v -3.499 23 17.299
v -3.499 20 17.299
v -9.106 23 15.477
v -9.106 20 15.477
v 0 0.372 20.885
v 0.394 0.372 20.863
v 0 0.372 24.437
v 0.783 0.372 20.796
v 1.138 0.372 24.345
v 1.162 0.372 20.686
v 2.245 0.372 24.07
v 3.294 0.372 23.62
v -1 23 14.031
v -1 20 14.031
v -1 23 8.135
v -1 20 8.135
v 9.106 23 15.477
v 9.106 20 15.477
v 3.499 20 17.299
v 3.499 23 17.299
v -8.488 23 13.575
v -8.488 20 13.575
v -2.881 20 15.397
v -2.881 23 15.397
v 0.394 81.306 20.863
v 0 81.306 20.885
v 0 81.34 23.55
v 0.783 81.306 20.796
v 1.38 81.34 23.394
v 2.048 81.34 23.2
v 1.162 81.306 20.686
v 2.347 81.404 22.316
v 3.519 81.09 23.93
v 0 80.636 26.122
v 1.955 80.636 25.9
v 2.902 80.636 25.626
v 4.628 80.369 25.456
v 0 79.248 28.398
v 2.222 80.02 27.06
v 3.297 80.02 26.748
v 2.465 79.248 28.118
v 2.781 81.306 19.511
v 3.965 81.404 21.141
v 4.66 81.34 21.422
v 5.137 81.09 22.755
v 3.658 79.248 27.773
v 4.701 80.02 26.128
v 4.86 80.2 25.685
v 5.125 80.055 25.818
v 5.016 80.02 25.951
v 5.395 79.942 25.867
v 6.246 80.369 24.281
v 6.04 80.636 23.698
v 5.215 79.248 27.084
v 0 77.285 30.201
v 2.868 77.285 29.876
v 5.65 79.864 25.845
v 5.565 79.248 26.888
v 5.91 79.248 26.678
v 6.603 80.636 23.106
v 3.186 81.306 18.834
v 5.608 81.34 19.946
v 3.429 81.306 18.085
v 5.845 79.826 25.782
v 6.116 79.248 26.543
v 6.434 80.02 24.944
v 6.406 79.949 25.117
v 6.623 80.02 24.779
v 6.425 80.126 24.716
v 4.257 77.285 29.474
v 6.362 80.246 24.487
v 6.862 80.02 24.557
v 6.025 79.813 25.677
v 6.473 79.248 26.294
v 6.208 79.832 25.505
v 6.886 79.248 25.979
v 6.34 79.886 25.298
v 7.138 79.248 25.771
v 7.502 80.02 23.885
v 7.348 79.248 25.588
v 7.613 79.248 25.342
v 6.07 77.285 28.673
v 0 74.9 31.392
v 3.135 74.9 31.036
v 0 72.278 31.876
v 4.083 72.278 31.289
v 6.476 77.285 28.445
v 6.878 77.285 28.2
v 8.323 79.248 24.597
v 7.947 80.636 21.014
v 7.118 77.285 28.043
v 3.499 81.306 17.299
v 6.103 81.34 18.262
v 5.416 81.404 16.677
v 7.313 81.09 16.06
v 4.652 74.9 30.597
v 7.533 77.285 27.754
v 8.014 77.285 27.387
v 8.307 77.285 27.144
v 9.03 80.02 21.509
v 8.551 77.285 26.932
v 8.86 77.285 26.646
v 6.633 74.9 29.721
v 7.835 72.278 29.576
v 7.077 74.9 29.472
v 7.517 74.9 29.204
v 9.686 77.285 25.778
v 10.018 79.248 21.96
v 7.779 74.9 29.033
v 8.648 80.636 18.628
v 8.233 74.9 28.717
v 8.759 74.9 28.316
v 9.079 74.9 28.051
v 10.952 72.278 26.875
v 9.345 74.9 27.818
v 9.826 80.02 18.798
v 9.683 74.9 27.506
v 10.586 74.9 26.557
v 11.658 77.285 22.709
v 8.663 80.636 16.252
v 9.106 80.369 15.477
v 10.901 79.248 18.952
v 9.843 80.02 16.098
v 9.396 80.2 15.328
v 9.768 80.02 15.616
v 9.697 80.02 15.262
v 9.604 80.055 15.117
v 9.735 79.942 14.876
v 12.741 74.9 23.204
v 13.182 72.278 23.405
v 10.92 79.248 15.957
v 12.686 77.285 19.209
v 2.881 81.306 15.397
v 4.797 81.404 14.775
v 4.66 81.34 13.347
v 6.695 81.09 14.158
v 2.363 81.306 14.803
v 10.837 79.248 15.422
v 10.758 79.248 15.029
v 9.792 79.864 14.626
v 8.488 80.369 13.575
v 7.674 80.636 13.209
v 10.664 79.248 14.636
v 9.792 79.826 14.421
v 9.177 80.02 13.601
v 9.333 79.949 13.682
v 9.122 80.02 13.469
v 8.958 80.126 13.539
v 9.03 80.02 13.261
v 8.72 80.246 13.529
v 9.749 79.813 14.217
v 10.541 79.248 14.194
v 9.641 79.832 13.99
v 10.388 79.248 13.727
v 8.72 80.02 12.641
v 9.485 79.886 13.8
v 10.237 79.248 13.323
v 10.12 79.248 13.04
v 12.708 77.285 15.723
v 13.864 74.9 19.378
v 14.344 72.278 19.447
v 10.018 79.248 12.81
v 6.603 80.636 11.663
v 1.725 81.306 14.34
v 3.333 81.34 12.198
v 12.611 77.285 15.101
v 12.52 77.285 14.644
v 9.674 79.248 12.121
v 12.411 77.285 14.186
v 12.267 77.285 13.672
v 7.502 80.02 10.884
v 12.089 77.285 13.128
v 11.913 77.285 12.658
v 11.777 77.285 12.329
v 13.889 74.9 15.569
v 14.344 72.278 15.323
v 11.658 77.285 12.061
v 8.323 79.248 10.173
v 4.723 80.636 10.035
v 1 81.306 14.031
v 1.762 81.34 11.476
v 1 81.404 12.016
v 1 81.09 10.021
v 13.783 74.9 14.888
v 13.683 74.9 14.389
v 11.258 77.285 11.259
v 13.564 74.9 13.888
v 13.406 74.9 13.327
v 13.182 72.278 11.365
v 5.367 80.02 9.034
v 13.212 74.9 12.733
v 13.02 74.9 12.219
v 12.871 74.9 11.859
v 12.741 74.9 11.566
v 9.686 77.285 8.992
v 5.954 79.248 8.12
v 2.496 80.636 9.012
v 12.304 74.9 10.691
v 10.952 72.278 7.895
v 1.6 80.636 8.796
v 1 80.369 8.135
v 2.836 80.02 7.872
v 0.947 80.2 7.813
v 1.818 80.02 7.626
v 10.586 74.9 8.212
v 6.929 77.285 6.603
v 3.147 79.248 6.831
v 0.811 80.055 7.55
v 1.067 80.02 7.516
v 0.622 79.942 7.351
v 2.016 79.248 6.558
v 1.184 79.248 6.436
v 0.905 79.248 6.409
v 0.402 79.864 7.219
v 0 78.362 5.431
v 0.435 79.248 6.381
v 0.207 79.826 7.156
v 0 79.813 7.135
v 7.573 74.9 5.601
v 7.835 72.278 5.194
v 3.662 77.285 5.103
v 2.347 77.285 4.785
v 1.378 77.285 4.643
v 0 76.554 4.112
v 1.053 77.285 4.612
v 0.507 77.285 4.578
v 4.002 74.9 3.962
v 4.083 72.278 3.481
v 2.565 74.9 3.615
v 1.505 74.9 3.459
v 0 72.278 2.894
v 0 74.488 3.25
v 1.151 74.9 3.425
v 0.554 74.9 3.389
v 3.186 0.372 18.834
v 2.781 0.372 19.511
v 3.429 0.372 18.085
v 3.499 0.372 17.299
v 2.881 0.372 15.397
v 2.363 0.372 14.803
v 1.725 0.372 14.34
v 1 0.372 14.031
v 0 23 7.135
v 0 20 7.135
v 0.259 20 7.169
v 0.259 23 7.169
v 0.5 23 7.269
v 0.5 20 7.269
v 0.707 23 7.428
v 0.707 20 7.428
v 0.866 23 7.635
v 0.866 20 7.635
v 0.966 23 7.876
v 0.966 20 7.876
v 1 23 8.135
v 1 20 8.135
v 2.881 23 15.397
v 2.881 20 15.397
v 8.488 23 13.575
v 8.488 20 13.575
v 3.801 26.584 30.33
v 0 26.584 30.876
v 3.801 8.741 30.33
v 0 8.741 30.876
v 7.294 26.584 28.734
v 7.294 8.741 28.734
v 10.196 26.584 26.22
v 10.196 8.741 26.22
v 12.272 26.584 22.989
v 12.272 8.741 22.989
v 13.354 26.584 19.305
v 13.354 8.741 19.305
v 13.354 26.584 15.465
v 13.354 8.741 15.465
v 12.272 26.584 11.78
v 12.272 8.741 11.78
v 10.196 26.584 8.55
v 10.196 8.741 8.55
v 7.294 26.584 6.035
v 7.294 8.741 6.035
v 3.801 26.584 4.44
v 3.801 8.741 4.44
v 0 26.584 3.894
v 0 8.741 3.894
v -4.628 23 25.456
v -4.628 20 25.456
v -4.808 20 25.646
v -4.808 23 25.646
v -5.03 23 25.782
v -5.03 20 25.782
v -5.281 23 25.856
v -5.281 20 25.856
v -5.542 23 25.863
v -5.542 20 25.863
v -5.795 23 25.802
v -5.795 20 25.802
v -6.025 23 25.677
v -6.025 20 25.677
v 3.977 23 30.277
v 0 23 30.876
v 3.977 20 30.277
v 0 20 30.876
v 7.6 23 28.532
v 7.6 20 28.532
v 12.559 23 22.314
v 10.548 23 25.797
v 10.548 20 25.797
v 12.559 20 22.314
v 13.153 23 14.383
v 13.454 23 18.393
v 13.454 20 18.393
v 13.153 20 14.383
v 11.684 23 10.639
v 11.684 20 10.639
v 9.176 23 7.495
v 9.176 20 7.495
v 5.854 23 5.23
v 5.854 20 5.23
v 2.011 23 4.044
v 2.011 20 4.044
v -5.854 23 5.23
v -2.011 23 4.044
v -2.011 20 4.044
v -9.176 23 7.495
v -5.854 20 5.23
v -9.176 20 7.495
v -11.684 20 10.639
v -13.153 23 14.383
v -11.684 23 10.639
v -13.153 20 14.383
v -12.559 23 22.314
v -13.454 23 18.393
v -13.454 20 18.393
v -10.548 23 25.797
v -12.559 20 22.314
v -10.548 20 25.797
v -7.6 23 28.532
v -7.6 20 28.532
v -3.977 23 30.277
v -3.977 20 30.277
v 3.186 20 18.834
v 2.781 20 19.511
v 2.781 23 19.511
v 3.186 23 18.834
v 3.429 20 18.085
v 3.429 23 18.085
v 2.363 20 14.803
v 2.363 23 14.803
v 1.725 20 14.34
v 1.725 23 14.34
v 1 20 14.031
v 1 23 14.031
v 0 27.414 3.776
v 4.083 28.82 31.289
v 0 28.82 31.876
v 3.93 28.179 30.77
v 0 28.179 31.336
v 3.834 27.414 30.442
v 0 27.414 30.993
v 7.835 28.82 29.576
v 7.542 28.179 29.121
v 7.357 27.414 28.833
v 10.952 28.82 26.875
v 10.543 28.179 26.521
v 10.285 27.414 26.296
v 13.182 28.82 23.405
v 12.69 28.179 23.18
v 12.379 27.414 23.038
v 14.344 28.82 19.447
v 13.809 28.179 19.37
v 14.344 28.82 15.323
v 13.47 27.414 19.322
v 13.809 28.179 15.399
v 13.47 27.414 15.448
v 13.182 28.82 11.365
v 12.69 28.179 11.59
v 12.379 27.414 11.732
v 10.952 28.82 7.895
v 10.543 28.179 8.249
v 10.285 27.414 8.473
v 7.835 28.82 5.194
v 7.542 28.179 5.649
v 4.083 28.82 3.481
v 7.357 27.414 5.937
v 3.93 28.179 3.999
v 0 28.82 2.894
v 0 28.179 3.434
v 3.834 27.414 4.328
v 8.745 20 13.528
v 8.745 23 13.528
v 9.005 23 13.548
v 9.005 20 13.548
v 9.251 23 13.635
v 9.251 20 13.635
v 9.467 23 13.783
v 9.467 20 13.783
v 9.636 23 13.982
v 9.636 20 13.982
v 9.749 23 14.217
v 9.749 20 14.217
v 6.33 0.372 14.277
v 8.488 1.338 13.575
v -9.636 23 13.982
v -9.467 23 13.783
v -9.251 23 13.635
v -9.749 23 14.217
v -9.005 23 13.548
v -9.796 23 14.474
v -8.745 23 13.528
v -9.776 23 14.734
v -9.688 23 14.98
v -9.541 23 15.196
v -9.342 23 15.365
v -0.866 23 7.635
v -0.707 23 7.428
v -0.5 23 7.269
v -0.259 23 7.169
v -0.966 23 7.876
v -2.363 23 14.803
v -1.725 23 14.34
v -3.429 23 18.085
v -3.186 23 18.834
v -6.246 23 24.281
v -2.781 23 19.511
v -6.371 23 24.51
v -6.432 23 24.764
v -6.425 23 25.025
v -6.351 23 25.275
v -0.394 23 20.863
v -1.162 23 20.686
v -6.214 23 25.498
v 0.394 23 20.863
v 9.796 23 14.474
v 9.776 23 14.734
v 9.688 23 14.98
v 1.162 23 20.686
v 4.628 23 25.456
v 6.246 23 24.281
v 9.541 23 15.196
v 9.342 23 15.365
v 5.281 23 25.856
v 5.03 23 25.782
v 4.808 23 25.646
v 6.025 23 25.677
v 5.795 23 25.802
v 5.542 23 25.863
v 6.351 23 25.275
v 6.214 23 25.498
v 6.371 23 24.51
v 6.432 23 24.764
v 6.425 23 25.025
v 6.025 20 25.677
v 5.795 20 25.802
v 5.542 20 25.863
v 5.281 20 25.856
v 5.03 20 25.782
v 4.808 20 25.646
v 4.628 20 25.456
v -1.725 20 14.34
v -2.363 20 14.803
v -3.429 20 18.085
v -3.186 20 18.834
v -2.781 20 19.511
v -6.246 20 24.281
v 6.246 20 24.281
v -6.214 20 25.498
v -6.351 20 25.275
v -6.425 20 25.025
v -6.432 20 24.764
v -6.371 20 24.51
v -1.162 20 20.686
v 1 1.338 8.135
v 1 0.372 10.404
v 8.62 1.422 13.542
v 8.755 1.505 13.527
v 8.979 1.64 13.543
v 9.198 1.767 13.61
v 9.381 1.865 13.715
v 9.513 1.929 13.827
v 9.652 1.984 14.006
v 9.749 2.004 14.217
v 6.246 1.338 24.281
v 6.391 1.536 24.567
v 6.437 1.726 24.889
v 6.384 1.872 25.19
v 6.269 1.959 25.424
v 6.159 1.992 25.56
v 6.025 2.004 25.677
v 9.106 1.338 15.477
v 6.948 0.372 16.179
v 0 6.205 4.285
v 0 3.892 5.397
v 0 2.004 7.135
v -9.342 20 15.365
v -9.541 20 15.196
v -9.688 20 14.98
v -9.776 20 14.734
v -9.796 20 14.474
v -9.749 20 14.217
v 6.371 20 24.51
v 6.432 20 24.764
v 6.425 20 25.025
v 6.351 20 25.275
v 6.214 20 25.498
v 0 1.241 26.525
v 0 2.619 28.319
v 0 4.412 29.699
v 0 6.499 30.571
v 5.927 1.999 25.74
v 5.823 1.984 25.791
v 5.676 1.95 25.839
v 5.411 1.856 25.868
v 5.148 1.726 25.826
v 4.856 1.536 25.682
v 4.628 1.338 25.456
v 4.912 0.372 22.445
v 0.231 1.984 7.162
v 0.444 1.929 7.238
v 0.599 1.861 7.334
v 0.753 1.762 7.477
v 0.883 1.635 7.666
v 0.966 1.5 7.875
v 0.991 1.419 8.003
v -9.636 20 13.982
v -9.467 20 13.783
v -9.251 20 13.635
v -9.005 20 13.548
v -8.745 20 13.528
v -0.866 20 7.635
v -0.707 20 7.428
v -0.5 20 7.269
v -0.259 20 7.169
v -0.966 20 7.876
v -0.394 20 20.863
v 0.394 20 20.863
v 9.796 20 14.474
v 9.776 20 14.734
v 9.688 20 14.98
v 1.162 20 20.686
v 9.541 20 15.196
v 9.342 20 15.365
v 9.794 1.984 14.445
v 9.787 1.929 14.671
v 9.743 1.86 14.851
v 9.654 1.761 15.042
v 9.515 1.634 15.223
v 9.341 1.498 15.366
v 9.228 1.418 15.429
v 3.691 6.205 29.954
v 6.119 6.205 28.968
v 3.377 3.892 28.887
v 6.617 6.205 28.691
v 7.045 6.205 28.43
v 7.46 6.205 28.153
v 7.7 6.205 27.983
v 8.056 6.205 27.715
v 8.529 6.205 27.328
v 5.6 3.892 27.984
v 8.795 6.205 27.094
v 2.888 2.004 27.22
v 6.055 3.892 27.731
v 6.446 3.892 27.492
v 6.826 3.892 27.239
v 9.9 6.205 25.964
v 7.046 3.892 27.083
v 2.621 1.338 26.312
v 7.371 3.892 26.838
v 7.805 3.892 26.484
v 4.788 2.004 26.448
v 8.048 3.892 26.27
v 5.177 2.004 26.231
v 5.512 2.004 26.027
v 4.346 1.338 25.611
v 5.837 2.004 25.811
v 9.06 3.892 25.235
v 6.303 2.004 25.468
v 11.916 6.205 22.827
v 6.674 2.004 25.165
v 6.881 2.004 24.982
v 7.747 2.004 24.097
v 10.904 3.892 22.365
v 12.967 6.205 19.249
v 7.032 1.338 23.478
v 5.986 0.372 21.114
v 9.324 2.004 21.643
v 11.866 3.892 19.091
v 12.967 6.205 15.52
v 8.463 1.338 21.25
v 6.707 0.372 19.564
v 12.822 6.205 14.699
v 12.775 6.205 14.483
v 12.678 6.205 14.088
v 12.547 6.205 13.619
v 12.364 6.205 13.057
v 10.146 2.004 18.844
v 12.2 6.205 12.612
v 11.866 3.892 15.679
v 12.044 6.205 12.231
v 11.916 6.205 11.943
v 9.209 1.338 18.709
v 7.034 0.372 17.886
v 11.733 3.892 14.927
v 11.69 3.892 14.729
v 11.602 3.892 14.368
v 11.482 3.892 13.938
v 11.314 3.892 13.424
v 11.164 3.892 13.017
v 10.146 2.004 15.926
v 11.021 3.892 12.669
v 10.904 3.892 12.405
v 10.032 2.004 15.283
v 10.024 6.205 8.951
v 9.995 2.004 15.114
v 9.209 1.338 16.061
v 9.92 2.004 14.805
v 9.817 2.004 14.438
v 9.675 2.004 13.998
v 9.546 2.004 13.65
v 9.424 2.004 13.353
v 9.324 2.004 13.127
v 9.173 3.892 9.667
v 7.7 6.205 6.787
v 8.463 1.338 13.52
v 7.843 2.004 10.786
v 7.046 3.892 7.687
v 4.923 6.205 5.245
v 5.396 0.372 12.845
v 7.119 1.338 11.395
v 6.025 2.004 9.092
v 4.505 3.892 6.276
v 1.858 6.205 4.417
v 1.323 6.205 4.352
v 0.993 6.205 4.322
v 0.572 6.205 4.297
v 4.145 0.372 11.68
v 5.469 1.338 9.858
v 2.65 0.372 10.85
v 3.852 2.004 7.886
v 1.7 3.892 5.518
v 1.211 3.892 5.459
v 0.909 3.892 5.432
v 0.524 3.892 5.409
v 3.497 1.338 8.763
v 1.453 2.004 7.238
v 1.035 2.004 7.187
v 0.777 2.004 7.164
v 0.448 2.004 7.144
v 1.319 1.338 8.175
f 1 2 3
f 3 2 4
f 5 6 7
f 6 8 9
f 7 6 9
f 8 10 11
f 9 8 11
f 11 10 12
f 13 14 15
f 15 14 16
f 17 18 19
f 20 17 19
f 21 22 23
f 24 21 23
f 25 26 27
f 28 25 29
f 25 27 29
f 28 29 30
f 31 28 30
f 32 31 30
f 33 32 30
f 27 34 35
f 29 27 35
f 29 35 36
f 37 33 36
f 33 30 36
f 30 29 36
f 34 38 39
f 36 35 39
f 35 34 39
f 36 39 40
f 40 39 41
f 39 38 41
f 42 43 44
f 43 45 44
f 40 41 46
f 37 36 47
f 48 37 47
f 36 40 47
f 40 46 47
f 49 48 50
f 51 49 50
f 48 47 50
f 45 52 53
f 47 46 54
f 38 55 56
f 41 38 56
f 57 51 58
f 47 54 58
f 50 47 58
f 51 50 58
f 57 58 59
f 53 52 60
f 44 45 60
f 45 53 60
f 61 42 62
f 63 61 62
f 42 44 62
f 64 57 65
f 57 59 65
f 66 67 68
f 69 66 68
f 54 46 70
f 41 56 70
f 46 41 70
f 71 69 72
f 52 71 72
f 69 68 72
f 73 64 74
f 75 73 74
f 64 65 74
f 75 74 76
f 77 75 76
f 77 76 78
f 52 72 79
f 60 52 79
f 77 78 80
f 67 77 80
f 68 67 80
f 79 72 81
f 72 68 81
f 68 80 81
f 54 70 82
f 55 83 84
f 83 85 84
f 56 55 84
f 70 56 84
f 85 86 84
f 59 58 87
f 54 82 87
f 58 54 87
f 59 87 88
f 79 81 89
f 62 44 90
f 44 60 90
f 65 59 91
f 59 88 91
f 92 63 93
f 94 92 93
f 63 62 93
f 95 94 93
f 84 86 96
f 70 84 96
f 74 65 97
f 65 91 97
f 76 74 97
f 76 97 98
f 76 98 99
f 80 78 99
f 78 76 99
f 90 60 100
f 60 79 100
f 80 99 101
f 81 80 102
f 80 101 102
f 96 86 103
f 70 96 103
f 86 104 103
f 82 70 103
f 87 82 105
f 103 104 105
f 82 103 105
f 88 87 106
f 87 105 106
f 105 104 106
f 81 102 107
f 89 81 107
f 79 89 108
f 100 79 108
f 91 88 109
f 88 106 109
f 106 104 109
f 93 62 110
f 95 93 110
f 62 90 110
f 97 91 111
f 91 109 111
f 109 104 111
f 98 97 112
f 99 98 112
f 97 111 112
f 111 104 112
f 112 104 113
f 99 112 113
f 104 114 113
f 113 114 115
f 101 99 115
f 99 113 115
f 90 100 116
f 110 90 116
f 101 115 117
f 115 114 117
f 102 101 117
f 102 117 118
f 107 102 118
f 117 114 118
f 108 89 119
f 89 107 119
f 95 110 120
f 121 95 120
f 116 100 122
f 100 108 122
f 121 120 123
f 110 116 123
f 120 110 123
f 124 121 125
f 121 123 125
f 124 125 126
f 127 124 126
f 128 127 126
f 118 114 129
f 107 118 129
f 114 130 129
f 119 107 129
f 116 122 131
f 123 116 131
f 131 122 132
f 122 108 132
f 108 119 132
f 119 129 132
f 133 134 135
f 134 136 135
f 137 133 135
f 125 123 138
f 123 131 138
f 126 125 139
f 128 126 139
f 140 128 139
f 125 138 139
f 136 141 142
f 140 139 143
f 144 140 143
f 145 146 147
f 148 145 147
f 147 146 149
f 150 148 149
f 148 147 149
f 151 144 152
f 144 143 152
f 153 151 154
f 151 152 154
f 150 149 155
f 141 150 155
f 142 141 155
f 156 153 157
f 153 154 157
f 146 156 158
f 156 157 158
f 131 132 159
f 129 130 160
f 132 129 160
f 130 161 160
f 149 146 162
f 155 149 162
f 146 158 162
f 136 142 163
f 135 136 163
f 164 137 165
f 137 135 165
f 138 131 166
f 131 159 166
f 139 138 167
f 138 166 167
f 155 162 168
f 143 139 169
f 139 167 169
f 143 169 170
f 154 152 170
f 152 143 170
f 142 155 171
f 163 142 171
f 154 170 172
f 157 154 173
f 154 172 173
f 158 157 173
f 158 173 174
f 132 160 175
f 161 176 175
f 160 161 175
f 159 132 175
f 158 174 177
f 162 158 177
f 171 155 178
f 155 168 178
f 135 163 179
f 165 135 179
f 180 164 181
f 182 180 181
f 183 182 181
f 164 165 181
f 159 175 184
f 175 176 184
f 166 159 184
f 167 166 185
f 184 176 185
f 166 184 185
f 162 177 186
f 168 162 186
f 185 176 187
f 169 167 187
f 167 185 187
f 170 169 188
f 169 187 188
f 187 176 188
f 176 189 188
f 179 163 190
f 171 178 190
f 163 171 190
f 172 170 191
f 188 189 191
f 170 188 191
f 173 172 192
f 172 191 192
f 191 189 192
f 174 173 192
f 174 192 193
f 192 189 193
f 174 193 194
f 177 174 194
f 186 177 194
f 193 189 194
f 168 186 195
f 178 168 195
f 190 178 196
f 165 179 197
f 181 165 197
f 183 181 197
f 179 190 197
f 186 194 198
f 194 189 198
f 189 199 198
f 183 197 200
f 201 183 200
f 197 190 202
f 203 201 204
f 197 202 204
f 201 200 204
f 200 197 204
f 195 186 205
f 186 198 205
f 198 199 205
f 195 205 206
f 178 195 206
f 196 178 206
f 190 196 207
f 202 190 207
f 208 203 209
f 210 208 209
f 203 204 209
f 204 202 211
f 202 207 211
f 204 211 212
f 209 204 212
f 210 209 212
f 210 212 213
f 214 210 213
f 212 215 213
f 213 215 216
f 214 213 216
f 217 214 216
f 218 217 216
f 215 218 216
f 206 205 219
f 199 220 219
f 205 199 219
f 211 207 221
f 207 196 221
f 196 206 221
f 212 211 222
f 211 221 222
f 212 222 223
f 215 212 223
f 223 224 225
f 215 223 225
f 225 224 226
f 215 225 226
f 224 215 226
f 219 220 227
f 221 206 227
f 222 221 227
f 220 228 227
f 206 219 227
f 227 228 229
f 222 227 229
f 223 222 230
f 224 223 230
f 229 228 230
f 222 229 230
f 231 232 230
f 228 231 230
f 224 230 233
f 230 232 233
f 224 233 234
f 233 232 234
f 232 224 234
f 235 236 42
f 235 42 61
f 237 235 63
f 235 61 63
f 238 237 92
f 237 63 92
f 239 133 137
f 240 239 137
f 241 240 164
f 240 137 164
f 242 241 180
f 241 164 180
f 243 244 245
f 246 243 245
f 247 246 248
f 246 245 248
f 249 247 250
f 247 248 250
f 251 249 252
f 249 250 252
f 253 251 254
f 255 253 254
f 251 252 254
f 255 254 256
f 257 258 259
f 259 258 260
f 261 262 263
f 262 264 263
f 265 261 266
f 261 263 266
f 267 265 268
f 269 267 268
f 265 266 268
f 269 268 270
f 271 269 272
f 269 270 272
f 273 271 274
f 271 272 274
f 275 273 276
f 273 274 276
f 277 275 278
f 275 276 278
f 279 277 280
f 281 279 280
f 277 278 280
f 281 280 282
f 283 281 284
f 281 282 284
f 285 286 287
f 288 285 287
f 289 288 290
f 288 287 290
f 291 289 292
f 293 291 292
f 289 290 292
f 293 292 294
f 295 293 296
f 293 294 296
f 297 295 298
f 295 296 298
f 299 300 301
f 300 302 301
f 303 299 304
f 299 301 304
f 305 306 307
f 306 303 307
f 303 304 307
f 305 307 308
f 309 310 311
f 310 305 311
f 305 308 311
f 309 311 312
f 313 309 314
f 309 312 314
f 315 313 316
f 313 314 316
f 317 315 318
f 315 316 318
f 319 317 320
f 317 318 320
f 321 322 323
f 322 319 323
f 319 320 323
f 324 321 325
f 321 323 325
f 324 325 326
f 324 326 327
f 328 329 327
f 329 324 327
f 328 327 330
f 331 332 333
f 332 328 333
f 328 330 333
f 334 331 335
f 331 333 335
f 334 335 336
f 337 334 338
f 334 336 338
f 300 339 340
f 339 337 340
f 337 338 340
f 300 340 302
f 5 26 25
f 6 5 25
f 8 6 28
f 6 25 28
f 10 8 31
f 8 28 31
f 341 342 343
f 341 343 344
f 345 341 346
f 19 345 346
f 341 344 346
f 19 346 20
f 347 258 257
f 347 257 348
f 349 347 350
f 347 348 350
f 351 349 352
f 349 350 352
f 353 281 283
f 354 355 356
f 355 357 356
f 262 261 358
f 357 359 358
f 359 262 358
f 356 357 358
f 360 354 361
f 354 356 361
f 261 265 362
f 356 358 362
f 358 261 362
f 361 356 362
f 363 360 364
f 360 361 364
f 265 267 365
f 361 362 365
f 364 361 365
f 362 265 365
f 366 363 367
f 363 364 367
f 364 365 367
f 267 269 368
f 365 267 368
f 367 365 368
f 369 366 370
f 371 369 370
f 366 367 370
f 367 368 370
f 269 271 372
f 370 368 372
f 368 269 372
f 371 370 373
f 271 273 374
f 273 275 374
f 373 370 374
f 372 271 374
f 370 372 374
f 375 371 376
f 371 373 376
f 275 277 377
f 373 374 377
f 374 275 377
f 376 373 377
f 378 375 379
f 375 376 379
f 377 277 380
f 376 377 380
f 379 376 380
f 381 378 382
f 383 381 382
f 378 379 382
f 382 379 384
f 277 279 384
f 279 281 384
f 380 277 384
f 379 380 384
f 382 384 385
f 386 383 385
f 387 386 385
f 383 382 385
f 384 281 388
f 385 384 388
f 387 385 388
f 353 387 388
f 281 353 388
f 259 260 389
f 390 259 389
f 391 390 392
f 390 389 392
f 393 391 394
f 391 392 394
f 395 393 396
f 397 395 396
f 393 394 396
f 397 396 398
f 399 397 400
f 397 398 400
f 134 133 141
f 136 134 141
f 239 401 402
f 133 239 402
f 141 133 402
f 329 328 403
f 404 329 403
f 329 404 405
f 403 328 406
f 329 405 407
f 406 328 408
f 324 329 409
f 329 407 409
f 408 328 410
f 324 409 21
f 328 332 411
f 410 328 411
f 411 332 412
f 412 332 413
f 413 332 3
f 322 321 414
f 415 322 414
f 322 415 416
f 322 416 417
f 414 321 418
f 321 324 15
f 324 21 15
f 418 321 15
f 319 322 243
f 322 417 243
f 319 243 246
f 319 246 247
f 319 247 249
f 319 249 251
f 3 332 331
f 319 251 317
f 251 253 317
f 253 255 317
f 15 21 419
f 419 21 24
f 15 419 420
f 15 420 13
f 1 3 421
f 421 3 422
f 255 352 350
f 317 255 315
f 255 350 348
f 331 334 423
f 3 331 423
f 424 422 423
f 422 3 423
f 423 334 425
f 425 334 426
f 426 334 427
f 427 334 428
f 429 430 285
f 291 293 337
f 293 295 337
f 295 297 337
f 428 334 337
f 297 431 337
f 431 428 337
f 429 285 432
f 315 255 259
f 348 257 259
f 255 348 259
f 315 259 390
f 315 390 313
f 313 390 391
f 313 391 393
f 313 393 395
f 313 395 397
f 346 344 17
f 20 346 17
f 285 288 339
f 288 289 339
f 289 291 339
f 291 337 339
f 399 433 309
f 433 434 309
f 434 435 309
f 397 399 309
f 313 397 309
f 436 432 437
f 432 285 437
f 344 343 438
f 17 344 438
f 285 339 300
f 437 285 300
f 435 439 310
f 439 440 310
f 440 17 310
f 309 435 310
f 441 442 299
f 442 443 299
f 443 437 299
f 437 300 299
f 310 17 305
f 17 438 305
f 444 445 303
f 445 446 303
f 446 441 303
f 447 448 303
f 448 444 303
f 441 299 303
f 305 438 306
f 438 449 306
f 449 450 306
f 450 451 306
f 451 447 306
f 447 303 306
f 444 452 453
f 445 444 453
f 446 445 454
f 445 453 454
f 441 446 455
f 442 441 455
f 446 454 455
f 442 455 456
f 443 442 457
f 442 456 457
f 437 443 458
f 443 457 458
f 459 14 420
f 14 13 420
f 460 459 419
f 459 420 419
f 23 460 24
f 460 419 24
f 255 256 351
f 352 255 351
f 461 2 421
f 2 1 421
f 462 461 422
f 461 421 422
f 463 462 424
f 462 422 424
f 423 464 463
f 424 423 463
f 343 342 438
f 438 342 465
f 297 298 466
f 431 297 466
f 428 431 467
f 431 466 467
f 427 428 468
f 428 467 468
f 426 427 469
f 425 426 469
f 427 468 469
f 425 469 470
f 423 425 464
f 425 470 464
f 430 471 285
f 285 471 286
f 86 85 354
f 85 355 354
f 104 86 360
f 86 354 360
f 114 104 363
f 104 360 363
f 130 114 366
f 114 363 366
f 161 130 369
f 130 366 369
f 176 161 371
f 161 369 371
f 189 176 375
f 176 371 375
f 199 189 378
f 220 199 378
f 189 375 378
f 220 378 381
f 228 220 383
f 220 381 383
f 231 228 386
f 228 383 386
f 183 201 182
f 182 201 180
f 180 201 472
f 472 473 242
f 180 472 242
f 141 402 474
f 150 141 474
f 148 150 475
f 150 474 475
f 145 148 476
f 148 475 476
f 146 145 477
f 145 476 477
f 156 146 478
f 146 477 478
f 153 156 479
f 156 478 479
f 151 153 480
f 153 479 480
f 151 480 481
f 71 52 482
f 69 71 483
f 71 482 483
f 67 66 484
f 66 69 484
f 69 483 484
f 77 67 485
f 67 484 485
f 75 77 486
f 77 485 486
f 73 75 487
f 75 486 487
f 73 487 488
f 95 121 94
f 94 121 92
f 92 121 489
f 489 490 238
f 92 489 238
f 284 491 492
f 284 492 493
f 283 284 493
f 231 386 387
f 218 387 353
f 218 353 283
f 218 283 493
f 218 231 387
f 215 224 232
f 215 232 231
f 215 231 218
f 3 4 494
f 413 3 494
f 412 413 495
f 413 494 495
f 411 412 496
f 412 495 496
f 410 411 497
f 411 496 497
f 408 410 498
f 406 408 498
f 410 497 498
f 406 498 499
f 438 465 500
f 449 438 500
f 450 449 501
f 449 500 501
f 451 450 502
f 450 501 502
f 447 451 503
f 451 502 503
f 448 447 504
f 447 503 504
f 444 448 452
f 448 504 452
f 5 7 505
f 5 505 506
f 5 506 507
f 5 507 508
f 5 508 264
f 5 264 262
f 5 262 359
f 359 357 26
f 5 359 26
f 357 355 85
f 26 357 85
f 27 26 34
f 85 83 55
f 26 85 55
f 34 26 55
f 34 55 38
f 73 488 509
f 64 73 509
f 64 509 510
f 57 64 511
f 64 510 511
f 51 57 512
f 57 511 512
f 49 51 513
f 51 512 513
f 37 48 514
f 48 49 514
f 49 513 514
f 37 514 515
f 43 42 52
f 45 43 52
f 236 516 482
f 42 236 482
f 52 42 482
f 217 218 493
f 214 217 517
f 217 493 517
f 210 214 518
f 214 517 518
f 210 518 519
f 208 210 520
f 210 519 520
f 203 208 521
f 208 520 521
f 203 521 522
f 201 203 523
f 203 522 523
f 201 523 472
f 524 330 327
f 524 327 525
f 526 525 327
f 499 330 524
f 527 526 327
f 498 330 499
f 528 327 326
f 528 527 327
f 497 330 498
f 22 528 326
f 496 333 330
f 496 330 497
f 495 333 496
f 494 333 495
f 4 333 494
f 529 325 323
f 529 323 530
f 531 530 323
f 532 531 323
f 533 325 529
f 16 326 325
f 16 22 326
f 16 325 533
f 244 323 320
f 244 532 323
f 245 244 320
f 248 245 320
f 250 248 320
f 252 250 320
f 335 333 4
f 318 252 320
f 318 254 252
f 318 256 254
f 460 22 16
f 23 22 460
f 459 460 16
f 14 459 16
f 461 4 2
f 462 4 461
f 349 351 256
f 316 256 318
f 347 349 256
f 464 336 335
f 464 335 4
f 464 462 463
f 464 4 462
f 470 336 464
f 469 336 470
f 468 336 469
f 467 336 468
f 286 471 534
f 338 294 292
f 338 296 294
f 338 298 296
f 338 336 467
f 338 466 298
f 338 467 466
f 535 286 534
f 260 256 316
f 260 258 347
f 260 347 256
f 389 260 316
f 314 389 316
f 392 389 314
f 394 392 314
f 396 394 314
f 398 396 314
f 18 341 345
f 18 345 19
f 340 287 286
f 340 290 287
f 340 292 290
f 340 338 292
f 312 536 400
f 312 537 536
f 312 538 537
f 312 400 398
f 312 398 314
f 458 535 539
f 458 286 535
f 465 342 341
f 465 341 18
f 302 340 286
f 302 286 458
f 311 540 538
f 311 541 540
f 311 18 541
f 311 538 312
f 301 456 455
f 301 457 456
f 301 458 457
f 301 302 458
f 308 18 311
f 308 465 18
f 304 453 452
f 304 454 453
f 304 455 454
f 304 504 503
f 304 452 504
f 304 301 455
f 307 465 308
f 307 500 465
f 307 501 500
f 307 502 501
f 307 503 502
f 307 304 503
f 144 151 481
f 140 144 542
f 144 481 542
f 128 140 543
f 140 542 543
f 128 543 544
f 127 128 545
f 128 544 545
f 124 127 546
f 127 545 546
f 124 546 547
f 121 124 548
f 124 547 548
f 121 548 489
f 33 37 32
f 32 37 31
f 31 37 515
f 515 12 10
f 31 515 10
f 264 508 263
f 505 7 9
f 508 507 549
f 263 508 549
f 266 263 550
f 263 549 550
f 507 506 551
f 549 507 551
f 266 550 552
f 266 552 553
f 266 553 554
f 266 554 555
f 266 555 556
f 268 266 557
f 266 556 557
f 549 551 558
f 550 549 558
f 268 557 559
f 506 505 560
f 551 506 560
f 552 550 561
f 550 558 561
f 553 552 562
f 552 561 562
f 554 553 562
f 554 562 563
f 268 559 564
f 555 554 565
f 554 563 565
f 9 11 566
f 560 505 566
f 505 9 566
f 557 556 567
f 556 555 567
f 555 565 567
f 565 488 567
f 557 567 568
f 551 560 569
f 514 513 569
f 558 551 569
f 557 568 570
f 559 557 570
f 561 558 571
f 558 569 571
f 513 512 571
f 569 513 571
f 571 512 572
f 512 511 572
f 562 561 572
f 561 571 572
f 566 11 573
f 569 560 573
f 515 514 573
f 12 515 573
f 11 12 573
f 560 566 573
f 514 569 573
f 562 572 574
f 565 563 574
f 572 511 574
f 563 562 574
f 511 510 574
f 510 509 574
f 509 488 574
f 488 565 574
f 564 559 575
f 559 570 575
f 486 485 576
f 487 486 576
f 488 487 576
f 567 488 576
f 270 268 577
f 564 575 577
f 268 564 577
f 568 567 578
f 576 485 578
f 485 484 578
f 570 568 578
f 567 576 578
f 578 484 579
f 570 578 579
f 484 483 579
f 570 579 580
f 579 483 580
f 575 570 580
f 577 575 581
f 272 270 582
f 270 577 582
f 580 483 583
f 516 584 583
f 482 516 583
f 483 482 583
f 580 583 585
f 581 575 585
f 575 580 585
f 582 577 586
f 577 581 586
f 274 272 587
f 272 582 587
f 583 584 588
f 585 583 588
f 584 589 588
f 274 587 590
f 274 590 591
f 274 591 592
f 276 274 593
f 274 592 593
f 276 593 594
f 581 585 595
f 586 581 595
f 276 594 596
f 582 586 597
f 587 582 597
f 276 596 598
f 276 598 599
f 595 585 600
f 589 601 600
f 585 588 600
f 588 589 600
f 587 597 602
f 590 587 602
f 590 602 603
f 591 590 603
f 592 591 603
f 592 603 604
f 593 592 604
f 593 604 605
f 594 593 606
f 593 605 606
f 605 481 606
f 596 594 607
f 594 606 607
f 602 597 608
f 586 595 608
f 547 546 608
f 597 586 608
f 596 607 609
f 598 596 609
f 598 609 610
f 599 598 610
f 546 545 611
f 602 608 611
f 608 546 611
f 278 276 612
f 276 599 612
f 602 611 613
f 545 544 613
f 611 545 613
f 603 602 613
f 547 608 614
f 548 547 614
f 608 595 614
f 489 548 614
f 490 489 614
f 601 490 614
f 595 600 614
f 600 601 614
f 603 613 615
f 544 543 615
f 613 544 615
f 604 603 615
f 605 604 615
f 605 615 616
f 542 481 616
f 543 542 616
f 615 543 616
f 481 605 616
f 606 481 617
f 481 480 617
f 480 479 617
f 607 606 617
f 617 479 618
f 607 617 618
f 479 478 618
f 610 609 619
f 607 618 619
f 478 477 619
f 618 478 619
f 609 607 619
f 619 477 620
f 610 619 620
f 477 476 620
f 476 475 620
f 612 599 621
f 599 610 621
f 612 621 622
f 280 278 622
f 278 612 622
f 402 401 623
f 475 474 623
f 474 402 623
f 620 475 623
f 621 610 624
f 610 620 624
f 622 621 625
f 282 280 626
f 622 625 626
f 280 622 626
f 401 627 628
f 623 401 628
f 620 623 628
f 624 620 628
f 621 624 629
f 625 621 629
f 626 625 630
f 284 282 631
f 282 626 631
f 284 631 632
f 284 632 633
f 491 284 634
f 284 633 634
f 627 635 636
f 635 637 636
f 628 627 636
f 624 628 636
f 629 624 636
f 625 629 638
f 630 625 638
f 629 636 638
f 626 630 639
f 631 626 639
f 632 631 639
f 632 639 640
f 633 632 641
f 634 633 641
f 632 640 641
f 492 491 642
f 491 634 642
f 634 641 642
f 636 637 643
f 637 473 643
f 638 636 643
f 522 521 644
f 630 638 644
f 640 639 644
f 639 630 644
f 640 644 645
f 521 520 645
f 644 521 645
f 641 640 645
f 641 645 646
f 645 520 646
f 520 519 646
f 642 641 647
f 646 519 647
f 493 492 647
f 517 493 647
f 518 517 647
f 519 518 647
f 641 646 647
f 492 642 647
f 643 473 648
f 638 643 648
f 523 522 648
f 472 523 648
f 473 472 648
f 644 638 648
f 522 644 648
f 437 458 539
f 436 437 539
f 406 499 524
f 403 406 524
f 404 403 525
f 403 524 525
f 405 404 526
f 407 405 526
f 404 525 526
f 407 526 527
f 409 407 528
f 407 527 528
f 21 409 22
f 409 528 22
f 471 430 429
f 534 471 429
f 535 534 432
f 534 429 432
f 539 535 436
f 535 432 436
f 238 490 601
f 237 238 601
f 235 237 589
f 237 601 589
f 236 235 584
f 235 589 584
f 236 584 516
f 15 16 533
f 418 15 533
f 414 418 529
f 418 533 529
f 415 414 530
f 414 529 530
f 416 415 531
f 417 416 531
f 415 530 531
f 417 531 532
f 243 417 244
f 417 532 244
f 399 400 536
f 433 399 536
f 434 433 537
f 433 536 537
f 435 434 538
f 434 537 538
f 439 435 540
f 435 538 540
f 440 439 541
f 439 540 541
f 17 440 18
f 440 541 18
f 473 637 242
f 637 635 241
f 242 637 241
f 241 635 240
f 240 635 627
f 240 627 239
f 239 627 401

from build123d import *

# Parameters (mm, degrees)
F4_ANGLE  = 180
F6_DEPTH  = 90
F8_COUNT  = 5
F12_START = -20
F11_R     = 13.4913344195
F12_DEPTH = 3


with BuildPart() as f4:
    # F3 (on Right) → F4 (revolve)
    with BuildSketch(Plane.YZ):
        with BuildLine():
            Line((0.3716222048, 20.884835436), (81.3056033368, 20.884835436))
            ThreePointArc((81.3056033368, 20.884835436), (79.2480851868, 28.3977219469), (72.2783456923, 31.8761664331))
            Line((72.2783456923, 31.8761664331), (28.8201148927, 31.8761664331))
            ThreePointArc((28.8201148927, 31.8761664331), (27.8087917866, 31.1375536456), (26.5840469152, 30.8761664331))
            Line((26.5840469152, 30.8761664331), (8.8330505692, 30.8761664331))
            Line((8.8330505692, 30.8761664331), (8.7405150061, 30.8761664331))
            ThreePointArc((8.7405150061, 30.8761664331), (3.470465515, 29.0675325384), (0.3716222048, 24.4370089889))
            Line((0.3716222048, 24.4370089889), (0.3716222048, 20.884835436))
        make_face()
    revolve(axis=Axis((0, 40.3716222048, 17.384835436), (0, 1, 0)), revolution_arc=F4_ANGLE)


with BuildPart() as f6:
    # F5 (on Front) → F6 (new body)
    with BuildSketch(Plane.XZ):
        with BuildLine():
            ThreePointArc((1, 14.0307334698), (0, 13.884835436), (-1, 14.0307334698))
            Line((-1, 14.0307334698), (-1, 8.1346530026))
            ThreePointArc((-1, 8.1346530026), (-0.7071067812, 7.4275462214), (0, 7.1346530026))
            ThreePointArc((0, 7.1346530026), (0.7071067812, 7.4275462214), (1, 8.1346530026))
            Line((1, 8.1346530026), (1, 14.0307334698))
        make_face()
    extrude(amount=-F6_DEPTH)


with BuildPart() as f8_1:
    # F8: instance of F6
    add(f6.part.rotate(Axis((0, 20.536005497, 17.384835436), (0, 1, 0)), 1 * 360 / F8_COUNT))


with BuildPart() as f8_2:
    # F8: instance of F6
    add(f6.part.rotate(Axis((0, 20.536005497, 17.384835436), (0, 1, 0)), 2 * 360 / F8_COUNT))


with BuildPart() as f8_3:
    # F8: instance of F6
    add(f6.part.rotate(Axis((0, 20.536005497, 17.384835436), (0, 1, 0)), 3 * 360 / F8_COUNT))


with BuildPart() as f8_4:
    # F8: instance of F6
    add(f6.part.rotate(Axis((0, 20.536005497, 17.384835436), (0, 1, 0)), 4 * 360 / F8_COUNT))


with BuildPart() as f4_1:
    add(f4.part)

    # F9: cut F6, F8_4, F8_3
    add(f6.part, mode=Mode.SUBTRACT)
    add(f8_4.part, mode=Mode.SUBTRACT)
    add(f8_3.part, mode=Mode.SUBTRACT)


with BuildPart() as f10:
    # F3 (on Right) → F10 (revolve)
    with BuildSketch(Plane.YZ):
        with BuildLine():
            Line((0.3716222048, 20.884835436), (81.3056033368, 20.884835436))
            ThreePointArc((81.3056033368, 20.884835436), (79.2480851868, 28.3977219469), (72.2783456923, 31.8761664331))
            Line((72.2783456923, 31.8761664331), (28.8201148927, 31.8761664331))
            ThreePointArc((28.8201148927, 31.8761664331), (27.8087917866, 31.1375536456), (26.5840469152, 30.8761664331))
            Line((26.5840469152, 30.8761664331), (8.8330505692, 30.8761664331))
            Line((8.8330505692, 30.8761664331), (8.7405150061, 30.8761664331))
            ThreePointArc((8.7405150061, 30.8761664331), (3.470465515, 29.0675325384), (0.3716222048, 24.4370089889))
            Line((0.3716222048, 24.4370089889), (0.3716222048, 20.884835436))
        make_face()
    revolve(axis=Axis((0, 40.3716222048, 17.384835436), (0, 1, 0)))

    # F13: cut F6, F8_4, F8_3, F8_2, F8_1
    add(f6.part, mode=Mode.SUBTRACT)
    add(f8_4.part, mode=Mode.SUBTRACT)
    add(f8_3.part, mode=Mode.SUBTRACT)
    add(f8_2.part, mode=Mode.SUBTRACT)
    add(f8_1.part, mode=Mode.SUBTRACT)


with BuildPart() as f12:
    # F11 (on Front) → F12 (new body)
    with BuildSketch(Plane.XZ.offset(F12_START)):
        with Locations((0, 17.384835436)):
            Circle(F11_R)
    extrude(amount=-F12_DEPTH)


with BuildPart() as f10_1:
    add(f10.part)

    # F14: intersect F12
    add(f12.part, mode=Mode.INTERSECT)


solid = Compound([f4_1.part, f10_1.part])
